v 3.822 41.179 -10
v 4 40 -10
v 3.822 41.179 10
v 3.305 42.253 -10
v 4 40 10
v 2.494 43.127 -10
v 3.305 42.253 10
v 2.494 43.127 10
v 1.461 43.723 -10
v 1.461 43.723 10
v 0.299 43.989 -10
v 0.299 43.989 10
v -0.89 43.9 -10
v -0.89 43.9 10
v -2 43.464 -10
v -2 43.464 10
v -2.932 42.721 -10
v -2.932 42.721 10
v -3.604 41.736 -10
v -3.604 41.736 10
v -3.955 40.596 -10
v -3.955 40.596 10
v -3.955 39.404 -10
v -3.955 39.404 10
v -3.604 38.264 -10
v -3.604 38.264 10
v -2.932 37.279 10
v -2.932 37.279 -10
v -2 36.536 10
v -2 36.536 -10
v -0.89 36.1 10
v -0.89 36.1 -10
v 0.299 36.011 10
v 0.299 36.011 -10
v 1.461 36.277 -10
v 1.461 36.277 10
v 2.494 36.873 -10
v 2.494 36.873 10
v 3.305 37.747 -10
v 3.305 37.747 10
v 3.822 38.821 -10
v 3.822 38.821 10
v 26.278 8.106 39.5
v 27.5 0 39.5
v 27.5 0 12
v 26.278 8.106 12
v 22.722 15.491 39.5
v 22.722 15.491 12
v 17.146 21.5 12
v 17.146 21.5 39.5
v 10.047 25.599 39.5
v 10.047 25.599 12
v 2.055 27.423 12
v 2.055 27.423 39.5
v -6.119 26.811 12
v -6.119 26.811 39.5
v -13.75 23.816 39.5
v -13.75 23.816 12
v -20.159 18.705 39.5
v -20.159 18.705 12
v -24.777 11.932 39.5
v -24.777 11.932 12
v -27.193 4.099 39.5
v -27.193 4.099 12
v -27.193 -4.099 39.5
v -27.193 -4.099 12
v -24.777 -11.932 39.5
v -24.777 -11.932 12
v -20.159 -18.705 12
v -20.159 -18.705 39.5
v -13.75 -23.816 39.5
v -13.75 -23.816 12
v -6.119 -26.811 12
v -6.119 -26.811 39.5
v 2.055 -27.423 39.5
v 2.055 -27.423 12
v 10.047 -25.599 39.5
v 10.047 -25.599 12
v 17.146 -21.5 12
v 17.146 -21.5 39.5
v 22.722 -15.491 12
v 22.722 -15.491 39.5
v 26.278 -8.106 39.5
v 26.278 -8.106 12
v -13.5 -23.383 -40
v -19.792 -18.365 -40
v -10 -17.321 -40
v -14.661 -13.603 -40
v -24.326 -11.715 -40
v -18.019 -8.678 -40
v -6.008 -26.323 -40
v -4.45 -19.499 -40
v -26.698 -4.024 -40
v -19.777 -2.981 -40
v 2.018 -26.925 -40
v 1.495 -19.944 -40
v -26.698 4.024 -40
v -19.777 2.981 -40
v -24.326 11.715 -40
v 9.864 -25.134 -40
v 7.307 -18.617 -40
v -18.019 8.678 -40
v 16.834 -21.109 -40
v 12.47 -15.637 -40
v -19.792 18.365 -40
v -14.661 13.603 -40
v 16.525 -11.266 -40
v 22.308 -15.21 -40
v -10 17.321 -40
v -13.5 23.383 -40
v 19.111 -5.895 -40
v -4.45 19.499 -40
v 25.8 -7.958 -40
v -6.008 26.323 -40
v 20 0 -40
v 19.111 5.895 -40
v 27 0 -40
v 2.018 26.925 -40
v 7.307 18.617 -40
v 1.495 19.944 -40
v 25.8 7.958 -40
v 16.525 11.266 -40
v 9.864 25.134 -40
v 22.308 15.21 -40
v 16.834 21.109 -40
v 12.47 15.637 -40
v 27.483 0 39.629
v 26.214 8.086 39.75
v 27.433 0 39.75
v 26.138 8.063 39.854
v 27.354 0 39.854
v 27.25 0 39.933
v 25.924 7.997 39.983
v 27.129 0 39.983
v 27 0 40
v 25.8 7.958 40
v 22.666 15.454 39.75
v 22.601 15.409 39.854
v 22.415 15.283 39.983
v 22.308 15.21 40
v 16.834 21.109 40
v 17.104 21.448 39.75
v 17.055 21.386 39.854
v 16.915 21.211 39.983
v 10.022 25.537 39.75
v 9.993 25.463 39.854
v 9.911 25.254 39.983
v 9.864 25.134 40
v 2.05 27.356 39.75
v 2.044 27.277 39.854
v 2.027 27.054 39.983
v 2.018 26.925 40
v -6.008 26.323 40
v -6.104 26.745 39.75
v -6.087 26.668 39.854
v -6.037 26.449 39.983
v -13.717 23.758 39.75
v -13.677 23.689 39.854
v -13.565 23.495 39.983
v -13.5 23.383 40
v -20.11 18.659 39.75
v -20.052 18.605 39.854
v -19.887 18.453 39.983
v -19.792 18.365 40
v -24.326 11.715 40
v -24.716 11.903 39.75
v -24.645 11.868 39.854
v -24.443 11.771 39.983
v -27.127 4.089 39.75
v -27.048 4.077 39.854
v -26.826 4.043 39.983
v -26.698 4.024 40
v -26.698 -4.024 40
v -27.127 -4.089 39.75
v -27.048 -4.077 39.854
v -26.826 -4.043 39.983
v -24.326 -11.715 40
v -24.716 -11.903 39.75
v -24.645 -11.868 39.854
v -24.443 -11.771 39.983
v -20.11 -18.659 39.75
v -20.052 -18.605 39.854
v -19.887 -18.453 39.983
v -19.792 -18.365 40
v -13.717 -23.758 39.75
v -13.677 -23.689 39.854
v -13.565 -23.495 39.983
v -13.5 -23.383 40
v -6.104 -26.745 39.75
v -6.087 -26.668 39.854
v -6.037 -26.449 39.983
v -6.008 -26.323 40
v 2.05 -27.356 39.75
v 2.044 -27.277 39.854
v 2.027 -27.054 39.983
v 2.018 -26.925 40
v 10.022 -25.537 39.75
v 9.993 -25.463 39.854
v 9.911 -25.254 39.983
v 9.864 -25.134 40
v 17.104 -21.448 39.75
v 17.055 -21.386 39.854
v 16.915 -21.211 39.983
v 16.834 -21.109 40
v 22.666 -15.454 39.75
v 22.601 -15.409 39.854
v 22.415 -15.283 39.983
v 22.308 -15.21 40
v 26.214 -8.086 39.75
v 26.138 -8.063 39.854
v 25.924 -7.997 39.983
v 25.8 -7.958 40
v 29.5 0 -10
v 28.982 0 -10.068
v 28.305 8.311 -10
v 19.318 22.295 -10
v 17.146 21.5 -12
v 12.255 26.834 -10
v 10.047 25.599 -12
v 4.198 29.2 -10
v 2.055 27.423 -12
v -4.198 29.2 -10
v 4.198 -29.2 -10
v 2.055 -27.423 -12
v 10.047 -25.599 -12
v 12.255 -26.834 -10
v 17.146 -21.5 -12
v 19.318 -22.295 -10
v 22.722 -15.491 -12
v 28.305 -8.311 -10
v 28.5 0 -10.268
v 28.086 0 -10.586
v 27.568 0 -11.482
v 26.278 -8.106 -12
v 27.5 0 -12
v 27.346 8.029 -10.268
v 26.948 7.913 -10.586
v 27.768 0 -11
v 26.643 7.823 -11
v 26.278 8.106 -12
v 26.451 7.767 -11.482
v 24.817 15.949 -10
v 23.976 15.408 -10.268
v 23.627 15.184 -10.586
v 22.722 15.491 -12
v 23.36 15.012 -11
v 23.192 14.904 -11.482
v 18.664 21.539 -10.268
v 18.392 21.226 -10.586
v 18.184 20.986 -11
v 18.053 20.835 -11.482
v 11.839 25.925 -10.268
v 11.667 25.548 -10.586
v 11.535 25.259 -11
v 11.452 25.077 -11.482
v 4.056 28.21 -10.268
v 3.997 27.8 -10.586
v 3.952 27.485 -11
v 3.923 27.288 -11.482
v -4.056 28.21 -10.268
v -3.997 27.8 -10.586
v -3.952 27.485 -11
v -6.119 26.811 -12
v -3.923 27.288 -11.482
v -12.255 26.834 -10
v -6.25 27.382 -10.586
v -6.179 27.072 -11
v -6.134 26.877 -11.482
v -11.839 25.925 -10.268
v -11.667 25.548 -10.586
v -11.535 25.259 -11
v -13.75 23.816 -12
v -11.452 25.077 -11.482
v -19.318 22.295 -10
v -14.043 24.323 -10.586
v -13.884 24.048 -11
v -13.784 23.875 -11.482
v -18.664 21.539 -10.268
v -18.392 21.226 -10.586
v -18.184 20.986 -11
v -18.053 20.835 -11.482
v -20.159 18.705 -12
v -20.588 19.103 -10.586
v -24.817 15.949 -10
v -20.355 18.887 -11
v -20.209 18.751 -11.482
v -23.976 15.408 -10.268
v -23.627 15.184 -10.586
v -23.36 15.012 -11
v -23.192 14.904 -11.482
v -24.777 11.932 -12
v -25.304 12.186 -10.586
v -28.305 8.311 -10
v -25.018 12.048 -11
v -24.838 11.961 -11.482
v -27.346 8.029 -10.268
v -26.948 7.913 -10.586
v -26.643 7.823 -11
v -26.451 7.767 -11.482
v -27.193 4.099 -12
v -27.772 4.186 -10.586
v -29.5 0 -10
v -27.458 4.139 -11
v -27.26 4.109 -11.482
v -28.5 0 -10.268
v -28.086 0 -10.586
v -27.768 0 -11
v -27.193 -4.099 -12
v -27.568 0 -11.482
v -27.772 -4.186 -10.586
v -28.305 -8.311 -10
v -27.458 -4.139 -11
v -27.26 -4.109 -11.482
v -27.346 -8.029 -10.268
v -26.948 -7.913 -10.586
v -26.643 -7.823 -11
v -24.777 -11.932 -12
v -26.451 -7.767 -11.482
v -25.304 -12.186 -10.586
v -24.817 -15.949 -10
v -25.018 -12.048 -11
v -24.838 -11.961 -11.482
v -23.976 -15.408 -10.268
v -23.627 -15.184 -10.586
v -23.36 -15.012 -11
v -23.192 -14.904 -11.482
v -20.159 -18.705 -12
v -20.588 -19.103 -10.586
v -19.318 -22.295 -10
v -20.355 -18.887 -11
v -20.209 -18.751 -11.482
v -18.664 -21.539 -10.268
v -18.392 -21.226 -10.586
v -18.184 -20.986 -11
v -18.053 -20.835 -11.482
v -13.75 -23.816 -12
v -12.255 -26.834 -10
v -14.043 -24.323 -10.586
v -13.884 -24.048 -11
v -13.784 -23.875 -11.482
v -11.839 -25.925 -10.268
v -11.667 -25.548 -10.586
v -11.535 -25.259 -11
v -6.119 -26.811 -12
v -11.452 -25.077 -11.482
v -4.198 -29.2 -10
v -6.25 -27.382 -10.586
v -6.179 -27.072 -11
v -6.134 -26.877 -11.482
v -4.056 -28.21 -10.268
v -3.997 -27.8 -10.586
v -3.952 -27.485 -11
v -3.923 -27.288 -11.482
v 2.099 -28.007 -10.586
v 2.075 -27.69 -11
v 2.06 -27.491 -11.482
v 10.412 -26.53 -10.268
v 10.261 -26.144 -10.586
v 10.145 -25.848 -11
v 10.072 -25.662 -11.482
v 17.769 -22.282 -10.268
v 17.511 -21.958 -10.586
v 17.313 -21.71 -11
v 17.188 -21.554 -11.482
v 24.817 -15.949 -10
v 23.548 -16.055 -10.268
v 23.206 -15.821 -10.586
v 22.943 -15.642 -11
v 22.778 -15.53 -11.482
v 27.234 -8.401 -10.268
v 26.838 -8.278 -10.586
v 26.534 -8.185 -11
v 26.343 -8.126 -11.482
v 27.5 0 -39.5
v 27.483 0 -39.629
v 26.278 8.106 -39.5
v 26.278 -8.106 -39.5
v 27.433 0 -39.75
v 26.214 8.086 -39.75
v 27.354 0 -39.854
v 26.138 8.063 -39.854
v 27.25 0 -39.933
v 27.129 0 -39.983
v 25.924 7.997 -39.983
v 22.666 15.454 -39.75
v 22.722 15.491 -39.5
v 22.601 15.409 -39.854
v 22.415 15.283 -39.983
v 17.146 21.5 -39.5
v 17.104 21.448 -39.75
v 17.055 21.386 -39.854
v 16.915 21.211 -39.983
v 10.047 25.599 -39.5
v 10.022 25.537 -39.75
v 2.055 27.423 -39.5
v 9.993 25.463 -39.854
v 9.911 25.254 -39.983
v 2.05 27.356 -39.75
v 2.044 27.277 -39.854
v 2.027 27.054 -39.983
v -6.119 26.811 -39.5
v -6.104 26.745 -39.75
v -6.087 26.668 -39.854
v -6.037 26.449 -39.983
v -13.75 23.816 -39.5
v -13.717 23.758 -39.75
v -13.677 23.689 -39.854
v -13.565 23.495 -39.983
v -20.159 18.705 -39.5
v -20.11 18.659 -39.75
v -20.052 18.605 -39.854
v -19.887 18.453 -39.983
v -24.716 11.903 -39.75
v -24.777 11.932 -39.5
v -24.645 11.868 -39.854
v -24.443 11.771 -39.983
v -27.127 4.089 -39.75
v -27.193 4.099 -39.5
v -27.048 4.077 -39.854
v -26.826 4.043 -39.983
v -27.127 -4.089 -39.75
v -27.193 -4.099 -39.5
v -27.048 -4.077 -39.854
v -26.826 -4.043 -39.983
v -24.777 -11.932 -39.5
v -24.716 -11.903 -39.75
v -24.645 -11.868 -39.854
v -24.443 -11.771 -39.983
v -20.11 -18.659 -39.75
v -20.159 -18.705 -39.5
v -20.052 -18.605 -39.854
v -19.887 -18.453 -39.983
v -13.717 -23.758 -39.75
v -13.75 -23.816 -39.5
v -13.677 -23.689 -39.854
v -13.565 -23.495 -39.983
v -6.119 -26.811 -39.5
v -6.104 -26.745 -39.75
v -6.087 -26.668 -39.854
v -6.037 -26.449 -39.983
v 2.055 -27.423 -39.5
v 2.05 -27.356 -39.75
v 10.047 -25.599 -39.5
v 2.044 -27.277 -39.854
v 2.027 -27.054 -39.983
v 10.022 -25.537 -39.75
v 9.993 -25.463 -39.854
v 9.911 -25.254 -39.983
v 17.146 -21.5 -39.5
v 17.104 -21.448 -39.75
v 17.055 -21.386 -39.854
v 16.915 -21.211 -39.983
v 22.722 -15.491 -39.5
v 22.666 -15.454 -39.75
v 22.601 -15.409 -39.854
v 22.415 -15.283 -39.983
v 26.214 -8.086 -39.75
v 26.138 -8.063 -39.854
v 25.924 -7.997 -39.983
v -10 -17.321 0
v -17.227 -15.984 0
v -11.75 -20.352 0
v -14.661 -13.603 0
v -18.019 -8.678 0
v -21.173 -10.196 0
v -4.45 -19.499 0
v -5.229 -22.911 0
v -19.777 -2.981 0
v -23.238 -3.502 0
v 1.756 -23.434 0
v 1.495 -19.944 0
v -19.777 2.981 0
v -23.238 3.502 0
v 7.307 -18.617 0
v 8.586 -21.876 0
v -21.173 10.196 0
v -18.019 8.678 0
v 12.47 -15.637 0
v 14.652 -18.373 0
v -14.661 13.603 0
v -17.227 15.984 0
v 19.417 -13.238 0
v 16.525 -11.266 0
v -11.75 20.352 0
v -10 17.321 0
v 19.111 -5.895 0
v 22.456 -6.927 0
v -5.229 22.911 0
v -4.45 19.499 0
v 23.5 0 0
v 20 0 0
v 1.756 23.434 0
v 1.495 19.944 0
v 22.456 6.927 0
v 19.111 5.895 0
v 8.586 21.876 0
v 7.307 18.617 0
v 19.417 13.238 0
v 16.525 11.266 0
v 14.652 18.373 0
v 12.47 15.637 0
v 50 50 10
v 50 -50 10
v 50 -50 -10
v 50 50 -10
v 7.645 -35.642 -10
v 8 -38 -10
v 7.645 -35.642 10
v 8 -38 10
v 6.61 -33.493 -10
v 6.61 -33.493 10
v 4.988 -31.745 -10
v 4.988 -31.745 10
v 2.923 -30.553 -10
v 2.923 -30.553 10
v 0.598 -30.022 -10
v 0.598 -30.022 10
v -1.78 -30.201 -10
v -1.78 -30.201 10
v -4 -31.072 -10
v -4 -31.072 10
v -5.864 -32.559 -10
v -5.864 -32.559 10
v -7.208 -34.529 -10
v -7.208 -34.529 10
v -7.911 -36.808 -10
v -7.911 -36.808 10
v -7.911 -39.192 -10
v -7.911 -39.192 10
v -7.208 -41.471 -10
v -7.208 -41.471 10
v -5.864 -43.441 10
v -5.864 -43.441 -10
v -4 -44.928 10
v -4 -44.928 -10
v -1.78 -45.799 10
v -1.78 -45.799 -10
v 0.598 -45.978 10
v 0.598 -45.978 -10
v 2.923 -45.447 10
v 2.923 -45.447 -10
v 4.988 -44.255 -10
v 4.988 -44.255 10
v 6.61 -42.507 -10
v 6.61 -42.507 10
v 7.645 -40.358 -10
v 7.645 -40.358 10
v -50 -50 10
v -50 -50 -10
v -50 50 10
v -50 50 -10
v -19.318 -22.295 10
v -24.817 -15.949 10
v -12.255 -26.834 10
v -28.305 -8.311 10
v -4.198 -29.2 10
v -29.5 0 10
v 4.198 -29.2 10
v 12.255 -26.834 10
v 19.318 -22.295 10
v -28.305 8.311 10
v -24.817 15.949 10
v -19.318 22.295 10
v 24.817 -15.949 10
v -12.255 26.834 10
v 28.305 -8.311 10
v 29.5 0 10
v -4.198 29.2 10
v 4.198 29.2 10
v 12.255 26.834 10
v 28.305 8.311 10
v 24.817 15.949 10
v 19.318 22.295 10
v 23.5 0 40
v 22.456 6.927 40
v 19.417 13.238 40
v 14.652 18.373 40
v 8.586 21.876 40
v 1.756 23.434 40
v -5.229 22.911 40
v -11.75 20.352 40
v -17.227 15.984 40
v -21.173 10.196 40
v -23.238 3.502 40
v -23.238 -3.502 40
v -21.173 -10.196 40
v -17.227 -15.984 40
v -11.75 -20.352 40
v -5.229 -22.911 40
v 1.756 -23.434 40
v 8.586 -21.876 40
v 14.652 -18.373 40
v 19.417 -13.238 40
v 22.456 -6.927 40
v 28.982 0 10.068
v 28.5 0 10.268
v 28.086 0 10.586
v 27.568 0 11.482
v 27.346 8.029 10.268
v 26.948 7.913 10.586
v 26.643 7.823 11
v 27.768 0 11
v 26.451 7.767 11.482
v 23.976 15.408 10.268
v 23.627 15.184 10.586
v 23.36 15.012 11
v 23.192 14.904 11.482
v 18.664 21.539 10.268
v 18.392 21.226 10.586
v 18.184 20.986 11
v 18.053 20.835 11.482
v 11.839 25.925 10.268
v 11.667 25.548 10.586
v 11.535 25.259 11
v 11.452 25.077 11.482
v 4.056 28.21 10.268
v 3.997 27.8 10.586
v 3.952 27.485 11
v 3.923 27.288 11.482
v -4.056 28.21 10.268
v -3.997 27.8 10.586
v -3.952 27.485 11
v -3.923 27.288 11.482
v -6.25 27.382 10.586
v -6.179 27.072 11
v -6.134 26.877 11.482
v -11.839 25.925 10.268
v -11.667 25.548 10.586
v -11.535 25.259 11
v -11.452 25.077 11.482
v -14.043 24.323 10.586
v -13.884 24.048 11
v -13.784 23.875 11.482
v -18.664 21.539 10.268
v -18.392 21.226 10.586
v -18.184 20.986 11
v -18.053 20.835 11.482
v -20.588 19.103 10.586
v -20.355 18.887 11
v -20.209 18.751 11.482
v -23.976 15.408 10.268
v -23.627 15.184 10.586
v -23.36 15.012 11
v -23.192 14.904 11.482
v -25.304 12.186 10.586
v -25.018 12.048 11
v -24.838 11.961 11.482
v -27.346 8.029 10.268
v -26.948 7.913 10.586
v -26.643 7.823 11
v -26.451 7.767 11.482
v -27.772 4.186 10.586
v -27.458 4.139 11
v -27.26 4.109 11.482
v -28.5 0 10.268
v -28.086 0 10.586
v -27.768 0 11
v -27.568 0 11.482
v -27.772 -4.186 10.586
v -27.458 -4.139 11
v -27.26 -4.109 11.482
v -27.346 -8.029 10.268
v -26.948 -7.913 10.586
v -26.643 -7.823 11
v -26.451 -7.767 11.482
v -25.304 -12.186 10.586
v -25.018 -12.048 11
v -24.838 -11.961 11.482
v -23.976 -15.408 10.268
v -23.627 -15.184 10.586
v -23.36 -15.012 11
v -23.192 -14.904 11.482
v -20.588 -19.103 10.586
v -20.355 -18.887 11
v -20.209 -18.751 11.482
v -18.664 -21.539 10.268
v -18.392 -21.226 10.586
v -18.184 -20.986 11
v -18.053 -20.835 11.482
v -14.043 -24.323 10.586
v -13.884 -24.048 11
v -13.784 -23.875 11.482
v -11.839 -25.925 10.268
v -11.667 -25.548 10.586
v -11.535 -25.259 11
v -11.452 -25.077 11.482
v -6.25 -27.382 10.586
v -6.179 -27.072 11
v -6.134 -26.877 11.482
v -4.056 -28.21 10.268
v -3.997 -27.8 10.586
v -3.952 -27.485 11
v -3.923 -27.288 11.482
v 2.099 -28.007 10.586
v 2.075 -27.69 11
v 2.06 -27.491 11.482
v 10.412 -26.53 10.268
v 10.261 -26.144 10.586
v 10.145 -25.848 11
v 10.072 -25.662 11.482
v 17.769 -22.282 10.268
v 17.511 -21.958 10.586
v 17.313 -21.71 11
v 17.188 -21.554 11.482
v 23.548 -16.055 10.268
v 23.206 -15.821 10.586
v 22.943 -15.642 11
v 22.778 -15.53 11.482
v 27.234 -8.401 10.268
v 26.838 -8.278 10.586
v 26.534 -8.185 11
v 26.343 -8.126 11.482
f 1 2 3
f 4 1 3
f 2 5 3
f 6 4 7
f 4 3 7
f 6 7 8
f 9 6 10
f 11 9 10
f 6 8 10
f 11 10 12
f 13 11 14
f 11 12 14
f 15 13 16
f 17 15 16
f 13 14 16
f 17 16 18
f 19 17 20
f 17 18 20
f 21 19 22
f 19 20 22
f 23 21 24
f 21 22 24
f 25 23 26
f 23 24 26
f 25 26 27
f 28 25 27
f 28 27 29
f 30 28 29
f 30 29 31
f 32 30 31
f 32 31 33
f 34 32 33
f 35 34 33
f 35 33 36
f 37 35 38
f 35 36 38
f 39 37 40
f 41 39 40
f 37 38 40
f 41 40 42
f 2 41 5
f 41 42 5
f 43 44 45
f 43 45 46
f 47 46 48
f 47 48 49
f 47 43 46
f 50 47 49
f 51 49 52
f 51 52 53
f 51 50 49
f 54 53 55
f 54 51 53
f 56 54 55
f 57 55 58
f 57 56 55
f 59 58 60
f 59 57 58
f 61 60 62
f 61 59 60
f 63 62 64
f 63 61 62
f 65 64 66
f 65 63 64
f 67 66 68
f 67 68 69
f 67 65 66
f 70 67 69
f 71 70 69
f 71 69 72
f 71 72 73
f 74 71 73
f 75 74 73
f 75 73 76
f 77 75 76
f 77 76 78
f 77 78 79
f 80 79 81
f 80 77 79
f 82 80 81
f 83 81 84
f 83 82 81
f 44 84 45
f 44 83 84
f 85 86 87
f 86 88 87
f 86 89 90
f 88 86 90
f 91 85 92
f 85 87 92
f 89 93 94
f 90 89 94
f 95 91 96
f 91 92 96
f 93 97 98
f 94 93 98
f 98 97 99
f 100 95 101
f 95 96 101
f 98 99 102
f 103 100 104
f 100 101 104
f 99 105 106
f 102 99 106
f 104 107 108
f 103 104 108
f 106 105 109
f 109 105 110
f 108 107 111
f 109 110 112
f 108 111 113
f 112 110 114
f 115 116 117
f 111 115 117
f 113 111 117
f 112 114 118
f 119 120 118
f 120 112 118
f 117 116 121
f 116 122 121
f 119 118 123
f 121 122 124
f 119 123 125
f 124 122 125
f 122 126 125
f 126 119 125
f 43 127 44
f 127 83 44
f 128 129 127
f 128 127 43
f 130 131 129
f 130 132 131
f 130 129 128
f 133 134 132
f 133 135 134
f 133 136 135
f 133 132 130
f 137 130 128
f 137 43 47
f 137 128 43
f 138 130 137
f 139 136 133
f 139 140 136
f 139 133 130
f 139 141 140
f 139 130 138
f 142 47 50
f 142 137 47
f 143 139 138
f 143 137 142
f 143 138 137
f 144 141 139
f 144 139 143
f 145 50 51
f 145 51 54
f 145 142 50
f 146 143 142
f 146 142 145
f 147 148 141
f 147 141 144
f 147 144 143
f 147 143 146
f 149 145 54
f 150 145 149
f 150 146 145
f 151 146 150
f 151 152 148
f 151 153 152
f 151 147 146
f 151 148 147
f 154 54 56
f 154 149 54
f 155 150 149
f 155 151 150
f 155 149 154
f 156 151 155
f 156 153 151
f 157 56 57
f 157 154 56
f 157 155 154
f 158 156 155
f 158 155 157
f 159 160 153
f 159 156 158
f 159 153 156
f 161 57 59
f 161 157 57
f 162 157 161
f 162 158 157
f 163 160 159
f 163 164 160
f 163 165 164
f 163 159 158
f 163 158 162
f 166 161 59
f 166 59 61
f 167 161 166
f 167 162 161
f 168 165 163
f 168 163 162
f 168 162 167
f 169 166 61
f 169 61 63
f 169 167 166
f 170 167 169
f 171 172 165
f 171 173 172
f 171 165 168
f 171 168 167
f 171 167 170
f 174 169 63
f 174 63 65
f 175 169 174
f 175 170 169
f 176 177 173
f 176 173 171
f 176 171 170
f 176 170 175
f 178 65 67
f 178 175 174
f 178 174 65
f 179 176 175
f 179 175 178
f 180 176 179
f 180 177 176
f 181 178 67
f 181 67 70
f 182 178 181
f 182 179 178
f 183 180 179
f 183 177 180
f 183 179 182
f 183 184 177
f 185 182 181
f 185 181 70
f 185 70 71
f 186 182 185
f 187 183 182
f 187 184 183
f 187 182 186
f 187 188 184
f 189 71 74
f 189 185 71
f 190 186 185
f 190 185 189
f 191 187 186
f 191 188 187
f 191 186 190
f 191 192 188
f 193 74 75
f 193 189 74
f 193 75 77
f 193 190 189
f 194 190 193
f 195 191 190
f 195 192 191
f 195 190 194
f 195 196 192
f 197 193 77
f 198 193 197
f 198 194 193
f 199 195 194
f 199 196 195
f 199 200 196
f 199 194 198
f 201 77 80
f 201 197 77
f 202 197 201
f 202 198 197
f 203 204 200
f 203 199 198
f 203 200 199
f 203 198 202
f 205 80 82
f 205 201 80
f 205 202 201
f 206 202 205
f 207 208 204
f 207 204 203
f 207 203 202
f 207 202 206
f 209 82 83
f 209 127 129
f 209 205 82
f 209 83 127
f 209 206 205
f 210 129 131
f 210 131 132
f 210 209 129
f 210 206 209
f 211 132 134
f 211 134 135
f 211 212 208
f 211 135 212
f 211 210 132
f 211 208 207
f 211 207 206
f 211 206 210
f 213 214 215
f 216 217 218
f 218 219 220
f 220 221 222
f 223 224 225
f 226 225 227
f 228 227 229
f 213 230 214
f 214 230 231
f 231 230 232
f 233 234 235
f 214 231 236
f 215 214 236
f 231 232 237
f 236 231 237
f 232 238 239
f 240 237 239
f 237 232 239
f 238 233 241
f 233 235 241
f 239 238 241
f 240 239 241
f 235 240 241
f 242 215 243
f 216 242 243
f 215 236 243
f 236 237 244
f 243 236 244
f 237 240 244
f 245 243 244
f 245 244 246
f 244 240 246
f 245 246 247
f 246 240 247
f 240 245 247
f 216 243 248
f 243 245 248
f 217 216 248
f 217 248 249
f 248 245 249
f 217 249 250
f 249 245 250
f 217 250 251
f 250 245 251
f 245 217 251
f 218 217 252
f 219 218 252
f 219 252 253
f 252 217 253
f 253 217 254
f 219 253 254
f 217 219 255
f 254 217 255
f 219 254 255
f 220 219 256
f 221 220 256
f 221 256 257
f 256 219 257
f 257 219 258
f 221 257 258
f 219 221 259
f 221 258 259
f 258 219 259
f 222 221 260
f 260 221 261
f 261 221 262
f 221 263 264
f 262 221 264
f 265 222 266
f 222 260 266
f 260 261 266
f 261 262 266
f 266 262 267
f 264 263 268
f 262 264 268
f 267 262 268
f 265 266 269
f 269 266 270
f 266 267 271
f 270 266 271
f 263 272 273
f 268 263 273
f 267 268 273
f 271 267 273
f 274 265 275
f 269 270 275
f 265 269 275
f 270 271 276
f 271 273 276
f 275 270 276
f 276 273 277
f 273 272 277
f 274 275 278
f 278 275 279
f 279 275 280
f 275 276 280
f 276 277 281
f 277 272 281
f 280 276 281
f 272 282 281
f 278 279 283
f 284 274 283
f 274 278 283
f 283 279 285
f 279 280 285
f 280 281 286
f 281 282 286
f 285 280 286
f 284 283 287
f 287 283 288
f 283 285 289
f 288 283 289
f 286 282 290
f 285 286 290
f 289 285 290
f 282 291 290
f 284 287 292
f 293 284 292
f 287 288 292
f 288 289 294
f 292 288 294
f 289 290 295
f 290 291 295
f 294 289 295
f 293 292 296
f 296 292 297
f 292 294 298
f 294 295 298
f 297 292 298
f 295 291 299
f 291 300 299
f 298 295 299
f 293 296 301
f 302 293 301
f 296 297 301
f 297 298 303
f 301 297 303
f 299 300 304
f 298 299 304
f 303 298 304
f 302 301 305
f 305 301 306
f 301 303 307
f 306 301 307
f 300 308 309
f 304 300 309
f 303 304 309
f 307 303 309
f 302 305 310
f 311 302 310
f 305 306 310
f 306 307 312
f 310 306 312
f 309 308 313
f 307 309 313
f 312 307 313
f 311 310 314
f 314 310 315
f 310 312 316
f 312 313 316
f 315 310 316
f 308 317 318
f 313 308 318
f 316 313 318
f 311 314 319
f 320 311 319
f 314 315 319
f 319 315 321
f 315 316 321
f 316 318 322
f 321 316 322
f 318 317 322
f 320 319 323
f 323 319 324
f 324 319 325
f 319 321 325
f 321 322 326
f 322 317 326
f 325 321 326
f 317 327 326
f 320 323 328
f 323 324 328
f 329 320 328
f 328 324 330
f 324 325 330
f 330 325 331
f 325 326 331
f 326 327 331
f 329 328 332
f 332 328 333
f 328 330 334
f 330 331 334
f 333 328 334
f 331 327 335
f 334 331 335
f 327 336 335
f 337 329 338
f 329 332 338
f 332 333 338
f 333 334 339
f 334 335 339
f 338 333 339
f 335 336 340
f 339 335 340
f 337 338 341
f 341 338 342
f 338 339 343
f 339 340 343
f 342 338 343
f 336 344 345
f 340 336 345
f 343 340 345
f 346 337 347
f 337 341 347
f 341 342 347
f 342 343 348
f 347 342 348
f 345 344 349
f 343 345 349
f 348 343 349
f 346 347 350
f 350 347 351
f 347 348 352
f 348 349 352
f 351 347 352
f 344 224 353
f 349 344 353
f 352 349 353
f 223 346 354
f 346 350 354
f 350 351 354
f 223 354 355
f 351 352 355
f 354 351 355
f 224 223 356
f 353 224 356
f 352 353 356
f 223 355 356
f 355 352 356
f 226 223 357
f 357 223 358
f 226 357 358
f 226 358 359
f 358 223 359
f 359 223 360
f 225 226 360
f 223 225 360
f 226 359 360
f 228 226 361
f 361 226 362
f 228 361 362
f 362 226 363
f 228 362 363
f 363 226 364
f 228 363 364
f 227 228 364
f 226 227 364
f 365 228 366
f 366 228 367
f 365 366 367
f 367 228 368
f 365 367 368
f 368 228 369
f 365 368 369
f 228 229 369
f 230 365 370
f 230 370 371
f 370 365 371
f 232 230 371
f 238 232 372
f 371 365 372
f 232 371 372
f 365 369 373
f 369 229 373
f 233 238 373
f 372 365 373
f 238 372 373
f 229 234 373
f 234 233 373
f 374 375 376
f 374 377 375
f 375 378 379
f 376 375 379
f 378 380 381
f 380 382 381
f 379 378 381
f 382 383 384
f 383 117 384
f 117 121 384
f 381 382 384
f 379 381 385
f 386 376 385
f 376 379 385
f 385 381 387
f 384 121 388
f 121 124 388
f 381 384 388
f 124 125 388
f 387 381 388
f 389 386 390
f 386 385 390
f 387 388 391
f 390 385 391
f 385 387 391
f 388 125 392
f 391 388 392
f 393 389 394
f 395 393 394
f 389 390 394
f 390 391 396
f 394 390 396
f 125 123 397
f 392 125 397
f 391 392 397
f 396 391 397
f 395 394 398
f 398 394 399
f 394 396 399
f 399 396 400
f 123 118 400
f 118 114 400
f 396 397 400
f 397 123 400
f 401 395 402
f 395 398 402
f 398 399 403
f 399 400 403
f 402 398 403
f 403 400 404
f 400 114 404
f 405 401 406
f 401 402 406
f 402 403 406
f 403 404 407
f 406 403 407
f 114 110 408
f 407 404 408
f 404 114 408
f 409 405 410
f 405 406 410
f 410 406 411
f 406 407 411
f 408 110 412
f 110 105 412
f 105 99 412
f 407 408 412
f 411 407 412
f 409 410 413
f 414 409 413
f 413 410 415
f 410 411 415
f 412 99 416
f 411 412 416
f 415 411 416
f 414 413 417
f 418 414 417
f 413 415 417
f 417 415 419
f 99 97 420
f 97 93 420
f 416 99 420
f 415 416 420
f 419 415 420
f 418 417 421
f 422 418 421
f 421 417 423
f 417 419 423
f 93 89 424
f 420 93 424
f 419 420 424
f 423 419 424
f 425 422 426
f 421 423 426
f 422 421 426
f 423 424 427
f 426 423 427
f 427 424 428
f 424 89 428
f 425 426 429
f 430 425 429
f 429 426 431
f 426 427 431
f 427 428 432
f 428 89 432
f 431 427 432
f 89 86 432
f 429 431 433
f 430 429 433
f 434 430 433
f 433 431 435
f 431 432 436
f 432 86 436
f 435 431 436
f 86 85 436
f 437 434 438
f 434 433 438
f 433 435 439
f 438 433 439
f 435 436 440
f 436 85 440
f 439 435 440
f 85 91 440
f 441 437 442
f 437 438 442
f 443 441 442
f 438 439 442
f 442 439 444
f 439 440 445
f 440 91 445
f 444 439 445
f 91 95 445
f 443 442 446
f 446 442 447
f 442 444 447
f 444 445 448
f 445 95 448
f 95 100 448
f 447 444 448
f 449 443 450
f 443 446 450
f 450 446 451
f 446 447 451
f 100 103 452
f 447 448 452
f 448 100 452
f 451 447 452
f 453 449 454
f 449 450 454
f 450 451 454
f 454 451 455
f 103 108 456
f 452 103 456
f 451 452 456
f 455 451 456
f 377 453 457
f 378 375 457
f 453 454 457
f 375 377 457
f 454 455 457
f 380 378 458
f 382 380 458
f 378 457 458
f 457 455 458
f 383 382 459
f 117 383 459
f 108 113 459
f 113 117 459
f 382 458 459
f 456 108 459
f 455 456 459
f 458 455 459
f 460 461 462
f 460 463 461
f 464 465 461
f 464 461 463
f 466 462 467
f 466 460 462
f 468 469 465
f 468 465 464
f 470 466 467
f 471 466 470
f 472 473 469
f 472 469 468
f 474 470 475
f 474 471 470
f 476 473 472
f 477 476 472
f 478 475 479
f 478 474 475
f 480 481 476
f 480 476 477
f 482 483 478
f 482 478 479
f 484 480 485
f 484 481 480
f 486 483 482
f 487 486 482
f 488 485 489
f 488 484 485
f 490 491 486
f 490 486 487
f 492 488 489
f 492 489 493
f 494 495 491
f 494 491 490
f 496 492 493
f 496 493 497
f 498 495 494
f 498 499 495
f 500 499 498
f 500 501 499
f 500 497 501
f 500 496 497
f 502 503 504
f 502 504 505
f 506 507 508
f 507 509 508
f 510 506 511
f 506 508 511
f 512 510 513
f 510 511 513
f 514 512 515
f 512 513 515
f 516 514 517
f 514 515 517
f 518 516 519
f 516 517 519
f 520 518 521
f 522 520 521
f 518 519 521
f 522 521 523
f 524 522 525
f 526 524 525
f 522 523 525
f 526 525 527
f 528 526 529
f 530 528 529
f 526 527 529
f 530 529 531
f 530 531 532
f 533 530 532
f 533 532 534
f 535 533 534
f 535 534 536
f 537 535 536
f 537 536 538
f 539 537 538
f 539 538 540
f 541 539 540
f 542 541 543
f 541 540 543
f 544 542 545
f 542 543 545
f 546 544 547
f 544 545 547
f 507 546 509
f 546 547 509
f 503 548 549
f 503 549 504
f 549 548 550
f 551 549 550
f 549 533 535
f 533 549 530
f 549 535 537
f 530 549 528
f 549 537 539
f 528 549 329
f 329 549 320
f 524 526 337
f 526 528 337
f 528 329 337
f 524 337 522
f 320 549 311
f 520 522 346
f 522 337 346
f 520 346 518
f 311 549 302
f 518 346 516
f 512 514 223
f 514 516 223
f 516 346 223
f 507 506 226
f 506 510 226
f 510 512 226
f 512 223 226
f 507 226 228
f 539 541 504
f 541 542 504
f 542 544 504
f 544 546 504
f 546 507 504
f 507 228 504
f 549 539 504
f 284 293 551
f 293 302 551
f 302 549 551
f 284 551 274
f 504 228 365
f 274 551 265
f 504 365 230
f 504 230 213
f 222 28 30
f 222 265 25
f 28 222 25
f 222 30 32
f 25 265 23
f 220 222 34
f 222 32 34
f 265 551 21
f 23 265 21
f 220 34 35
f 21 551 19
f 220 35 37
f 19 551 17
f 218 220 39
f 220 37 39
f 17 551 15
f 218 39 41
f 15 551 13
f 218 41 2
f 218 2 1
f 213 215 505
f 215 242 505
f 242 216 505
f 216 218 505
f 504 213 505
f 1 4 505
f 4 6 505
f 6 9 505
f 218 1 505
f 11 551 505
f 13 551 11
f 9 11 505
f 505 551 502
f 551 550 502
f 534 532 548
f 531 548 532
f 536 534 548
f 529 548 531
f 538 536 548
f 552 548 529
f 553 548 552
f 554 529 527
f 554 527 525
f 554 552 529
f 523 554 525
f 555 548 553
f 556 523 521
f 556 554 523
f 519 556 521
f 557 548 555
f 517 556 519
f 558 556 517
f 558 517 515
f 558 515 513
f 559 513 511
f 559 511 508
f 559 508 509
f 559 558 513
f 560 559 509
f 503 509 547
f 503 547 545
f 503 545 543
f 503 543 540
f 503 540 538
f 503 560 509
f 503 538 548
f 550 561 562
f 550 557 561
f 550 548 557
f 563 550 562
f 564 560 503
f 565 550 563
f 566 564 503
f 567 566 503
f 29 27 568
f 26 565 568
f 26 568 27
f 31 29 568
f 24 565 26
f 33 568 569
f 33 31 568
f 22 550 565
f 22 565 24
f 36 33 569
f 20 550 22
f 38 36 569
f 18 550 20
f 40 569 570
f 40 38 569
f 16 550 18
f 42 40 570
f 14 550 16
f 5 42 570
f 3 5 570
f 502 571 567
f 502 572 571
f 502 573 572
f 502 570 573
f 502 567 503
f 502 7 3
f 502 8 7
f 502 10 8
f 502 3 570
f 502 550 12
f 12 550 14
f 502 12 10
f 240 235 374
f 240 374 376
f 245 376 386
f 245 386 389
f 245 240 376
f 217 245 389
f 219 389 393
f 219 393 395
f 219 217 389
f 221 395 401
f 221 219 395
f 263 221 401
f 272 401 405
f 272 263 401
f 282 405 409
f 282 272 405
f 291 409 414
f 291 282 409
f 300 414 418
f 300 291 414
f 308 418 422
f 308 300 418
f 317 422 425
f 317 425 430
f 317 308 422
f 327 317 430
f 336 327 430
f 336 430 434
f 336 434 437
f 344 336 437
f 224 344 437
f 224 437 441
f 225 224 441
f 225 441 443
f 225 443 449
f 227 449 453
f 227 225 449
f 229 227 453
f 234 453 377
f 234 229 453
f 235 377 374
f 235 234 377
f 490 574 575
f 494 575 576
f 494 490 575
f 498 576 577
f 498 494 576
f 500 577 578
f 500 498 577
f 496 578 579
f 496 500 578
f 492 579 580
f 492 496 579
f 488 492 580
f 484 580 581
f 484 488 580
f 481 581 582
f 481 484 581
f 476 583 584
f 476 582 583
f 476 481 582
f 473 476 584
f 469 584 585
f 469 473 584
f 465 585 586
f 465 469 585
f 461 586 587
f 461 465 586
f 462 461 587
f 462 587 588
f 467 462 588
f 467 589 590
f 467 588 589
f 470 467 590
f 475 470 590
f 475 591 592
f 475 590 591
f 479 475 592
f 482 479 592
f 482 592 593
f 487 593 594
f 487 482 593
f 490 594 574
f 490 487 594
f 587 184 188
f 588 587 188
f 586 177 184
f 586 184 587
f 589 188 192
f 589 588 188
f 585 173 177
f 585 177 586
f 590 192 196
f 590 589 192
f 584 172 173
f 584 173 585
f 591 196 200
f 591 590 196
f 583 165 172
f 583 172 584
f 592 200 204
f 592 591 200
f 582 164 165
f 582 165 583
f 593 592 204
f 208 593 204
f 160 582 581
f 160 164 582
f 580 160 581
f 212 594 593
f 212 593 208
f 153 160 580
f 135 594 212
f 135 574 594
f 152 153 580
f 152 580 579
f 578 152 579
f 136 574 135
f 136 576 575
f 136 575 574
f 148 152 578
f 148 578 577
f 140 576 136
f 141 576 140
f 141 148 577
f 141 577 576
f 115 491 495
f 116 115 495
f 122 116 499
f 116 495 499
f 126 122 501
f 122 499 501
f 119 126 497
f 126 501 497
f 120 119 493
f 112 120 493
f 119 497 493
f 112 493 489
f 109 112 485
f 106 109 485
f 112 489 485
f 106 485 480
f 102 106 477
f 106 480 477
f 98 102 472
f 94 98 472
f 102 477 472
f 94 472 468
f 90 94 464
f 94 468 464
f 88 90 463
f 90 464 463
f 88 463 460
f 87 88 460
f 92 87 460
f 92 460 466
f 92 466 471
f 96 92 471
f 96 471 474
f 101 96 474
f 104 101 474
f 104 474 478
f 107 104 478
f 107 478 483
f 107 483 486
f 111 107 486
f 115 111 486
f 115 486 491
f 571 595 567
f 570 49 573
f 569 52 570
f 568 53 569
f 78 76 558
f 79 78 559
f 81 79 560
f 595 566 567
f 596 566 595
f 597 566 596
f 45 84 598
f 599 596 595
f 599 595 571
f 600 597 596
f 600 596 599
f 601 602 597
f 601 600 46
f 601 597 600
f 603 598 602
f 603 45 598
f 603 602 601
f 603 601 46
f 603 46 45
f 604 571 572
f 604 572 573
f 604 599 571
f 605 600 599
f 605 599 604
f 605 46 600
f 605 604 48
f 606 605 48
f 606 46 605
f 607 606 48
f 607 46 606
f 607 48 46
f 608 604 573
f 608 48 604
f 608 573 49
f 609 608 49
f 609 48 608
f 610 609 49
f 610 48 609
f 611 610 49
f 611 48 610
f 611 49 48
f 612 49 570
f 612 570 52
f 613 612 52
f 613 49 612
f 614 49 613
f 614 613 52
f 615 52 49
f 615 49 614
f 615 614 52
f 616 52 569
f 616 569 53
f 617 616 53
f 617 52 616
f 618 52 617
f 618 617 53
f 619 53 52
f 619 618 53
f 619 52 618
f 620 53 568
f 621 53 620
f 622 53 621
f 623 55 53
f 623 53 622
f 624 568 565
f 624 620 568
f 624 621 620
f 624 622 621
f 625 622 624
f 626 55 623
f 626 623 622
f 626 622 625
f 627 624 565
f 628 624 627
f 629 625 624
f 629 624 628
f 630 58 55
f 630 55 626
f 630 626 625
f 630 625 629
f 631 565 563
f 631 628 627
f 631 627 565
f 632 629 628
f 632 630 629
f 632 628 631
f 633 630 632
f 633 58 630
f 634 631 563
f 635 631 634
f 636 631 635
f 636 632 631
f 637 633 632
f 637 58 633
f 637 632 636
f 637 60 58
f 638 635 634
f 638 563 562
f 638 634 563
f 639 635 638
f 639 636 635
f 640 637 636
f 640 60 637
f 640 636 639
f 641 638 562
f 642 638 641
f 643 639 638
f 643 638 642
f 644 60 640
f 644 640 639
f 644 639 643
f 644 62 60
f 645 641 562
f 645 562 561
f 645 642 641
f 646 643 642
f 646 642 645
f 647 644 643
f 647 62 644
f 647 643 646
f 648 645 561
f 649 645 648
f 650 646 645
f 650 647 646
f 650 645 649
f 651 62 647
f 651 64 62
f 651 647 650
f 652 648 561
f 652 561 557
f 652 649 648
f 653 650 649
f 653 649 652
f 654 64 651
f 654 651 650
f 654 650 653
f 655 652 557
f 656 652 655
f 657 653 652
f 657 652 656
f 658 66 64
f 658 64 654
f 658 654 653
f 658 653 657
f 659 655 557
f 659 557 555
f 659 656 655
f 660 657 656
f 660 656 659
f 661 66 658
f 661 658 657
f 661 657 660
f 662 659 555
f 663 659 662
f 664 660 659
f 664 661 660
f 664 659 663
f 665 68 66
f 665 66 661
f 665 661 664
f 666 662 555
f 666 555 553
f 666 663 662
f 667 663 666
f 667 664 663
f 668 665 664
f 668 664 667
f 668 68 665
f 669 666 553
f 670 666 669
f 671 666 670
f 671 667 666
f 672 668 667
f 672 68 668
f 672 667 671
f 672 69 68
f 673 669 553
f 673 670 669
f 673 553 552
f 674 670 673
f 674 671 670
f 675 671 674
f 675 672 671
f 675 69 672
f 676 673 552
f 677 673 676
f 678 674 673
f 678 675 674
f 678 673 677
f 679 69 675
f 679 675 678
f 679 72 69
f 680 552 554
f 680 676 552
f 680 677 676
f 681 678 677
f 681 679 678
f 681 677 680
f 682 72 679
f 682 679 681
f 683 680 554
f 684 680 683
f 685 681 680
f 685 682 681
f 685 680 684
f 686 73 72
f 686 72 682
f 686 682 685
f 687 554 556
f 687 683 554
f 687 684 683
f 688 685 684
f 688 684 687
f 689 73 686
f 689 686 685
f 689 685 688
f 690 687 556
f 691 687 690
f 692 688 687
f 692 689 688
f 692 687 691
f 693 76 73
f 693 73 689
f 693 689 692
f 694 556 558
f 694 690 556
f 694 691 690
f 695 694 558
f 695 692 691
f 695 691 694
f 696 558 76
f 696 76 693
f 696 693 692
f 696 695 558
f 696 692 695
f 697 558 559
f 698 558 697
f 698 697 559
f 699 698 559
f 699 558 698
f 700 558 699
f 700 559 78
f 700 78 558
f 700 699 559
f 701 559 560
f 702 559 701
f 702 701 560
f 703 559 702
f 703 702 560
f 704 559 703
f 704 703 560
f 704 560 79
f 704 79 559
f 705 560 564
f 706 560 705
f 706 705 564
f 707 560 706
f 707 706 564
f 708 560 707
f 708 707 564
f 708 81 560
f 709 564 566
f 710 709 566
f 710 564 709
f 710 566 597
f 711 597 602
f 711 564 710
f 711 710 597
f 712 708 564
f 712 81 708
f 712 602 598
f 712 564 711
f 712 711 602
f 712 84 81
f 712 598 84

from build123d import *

# Parameters (mm, degrees)
F0_R      = 27.5
F2_DEPTH  = 40
F4_W      = 100
F4_H      = 100
F5_DEPTH  = 10
F3_R      = 20
F6_DEPTH  = 40.001
F1_R      = 23.5
F7_DEPTH  = 40.001
F10_R     = 2
F11_R     = 0.5
F8_R      = 8
F9_R      = 4
F12_DEPTH = 15


with BuildPart() as f2:
    # F0 (on Top) → F2 (new body, symmetric)
    with BuildSketch(Plane.XY):
        Circle(F0_R)
    extrude(amount=F2_DEPTH, both=True)

    # F4 (on Top) → F5 (join, symmetric)
    with BuildSketch(Plane.XY):
        Rectangle(F4_W, F4_H)
    extrude(amount=F5_DEPTH, both=True)

    # F3 (on Top) → F6 (cut, through all)
    with BuildSketch(Plane.XY):
        Circle(F3_R)
    extrude(amount=-F6_DEPTH, mode=Mode.SUBTRACT)

    # F1 (on Top) → F7 (cut, through all)
    with BuildSketch(Plane.XY):
        Circle(F1_R)
    extrude(amount=F7_DEPTH, mode=Mode.SUBTRACT)

    # F10
    f10_edges = [f2.edges().sort_by_distance(p)[0] for p in [
        (-27.5, 0, 10),
        (-27.5, 0, -10),
    ]]
    fillet(f10_edges, radius=F10_R)

    # F11
    f11_edges = [f2.edges().sort_by_distance(p)[0] for p in [
        (-27.5, 0, -40),
        (-27.5, 0, 40),
    ]]
    fillet(f11_edges, radius=F11_R)

    # F8 (on Top) + F9 (on Top) → F12 (cut, symmetric)
    with BuildSketch(Plane.XY):
        with Locations((0, -38)):
            Circle(F8_R)
    with BuildSketch(Plane.XY):
        with Locations((0, 40)):
            Circle(F9_R)
    extrude(amount=F12_DEPTH, both=True, mode=Mode.SUBTRACT)


solid = f2.part
